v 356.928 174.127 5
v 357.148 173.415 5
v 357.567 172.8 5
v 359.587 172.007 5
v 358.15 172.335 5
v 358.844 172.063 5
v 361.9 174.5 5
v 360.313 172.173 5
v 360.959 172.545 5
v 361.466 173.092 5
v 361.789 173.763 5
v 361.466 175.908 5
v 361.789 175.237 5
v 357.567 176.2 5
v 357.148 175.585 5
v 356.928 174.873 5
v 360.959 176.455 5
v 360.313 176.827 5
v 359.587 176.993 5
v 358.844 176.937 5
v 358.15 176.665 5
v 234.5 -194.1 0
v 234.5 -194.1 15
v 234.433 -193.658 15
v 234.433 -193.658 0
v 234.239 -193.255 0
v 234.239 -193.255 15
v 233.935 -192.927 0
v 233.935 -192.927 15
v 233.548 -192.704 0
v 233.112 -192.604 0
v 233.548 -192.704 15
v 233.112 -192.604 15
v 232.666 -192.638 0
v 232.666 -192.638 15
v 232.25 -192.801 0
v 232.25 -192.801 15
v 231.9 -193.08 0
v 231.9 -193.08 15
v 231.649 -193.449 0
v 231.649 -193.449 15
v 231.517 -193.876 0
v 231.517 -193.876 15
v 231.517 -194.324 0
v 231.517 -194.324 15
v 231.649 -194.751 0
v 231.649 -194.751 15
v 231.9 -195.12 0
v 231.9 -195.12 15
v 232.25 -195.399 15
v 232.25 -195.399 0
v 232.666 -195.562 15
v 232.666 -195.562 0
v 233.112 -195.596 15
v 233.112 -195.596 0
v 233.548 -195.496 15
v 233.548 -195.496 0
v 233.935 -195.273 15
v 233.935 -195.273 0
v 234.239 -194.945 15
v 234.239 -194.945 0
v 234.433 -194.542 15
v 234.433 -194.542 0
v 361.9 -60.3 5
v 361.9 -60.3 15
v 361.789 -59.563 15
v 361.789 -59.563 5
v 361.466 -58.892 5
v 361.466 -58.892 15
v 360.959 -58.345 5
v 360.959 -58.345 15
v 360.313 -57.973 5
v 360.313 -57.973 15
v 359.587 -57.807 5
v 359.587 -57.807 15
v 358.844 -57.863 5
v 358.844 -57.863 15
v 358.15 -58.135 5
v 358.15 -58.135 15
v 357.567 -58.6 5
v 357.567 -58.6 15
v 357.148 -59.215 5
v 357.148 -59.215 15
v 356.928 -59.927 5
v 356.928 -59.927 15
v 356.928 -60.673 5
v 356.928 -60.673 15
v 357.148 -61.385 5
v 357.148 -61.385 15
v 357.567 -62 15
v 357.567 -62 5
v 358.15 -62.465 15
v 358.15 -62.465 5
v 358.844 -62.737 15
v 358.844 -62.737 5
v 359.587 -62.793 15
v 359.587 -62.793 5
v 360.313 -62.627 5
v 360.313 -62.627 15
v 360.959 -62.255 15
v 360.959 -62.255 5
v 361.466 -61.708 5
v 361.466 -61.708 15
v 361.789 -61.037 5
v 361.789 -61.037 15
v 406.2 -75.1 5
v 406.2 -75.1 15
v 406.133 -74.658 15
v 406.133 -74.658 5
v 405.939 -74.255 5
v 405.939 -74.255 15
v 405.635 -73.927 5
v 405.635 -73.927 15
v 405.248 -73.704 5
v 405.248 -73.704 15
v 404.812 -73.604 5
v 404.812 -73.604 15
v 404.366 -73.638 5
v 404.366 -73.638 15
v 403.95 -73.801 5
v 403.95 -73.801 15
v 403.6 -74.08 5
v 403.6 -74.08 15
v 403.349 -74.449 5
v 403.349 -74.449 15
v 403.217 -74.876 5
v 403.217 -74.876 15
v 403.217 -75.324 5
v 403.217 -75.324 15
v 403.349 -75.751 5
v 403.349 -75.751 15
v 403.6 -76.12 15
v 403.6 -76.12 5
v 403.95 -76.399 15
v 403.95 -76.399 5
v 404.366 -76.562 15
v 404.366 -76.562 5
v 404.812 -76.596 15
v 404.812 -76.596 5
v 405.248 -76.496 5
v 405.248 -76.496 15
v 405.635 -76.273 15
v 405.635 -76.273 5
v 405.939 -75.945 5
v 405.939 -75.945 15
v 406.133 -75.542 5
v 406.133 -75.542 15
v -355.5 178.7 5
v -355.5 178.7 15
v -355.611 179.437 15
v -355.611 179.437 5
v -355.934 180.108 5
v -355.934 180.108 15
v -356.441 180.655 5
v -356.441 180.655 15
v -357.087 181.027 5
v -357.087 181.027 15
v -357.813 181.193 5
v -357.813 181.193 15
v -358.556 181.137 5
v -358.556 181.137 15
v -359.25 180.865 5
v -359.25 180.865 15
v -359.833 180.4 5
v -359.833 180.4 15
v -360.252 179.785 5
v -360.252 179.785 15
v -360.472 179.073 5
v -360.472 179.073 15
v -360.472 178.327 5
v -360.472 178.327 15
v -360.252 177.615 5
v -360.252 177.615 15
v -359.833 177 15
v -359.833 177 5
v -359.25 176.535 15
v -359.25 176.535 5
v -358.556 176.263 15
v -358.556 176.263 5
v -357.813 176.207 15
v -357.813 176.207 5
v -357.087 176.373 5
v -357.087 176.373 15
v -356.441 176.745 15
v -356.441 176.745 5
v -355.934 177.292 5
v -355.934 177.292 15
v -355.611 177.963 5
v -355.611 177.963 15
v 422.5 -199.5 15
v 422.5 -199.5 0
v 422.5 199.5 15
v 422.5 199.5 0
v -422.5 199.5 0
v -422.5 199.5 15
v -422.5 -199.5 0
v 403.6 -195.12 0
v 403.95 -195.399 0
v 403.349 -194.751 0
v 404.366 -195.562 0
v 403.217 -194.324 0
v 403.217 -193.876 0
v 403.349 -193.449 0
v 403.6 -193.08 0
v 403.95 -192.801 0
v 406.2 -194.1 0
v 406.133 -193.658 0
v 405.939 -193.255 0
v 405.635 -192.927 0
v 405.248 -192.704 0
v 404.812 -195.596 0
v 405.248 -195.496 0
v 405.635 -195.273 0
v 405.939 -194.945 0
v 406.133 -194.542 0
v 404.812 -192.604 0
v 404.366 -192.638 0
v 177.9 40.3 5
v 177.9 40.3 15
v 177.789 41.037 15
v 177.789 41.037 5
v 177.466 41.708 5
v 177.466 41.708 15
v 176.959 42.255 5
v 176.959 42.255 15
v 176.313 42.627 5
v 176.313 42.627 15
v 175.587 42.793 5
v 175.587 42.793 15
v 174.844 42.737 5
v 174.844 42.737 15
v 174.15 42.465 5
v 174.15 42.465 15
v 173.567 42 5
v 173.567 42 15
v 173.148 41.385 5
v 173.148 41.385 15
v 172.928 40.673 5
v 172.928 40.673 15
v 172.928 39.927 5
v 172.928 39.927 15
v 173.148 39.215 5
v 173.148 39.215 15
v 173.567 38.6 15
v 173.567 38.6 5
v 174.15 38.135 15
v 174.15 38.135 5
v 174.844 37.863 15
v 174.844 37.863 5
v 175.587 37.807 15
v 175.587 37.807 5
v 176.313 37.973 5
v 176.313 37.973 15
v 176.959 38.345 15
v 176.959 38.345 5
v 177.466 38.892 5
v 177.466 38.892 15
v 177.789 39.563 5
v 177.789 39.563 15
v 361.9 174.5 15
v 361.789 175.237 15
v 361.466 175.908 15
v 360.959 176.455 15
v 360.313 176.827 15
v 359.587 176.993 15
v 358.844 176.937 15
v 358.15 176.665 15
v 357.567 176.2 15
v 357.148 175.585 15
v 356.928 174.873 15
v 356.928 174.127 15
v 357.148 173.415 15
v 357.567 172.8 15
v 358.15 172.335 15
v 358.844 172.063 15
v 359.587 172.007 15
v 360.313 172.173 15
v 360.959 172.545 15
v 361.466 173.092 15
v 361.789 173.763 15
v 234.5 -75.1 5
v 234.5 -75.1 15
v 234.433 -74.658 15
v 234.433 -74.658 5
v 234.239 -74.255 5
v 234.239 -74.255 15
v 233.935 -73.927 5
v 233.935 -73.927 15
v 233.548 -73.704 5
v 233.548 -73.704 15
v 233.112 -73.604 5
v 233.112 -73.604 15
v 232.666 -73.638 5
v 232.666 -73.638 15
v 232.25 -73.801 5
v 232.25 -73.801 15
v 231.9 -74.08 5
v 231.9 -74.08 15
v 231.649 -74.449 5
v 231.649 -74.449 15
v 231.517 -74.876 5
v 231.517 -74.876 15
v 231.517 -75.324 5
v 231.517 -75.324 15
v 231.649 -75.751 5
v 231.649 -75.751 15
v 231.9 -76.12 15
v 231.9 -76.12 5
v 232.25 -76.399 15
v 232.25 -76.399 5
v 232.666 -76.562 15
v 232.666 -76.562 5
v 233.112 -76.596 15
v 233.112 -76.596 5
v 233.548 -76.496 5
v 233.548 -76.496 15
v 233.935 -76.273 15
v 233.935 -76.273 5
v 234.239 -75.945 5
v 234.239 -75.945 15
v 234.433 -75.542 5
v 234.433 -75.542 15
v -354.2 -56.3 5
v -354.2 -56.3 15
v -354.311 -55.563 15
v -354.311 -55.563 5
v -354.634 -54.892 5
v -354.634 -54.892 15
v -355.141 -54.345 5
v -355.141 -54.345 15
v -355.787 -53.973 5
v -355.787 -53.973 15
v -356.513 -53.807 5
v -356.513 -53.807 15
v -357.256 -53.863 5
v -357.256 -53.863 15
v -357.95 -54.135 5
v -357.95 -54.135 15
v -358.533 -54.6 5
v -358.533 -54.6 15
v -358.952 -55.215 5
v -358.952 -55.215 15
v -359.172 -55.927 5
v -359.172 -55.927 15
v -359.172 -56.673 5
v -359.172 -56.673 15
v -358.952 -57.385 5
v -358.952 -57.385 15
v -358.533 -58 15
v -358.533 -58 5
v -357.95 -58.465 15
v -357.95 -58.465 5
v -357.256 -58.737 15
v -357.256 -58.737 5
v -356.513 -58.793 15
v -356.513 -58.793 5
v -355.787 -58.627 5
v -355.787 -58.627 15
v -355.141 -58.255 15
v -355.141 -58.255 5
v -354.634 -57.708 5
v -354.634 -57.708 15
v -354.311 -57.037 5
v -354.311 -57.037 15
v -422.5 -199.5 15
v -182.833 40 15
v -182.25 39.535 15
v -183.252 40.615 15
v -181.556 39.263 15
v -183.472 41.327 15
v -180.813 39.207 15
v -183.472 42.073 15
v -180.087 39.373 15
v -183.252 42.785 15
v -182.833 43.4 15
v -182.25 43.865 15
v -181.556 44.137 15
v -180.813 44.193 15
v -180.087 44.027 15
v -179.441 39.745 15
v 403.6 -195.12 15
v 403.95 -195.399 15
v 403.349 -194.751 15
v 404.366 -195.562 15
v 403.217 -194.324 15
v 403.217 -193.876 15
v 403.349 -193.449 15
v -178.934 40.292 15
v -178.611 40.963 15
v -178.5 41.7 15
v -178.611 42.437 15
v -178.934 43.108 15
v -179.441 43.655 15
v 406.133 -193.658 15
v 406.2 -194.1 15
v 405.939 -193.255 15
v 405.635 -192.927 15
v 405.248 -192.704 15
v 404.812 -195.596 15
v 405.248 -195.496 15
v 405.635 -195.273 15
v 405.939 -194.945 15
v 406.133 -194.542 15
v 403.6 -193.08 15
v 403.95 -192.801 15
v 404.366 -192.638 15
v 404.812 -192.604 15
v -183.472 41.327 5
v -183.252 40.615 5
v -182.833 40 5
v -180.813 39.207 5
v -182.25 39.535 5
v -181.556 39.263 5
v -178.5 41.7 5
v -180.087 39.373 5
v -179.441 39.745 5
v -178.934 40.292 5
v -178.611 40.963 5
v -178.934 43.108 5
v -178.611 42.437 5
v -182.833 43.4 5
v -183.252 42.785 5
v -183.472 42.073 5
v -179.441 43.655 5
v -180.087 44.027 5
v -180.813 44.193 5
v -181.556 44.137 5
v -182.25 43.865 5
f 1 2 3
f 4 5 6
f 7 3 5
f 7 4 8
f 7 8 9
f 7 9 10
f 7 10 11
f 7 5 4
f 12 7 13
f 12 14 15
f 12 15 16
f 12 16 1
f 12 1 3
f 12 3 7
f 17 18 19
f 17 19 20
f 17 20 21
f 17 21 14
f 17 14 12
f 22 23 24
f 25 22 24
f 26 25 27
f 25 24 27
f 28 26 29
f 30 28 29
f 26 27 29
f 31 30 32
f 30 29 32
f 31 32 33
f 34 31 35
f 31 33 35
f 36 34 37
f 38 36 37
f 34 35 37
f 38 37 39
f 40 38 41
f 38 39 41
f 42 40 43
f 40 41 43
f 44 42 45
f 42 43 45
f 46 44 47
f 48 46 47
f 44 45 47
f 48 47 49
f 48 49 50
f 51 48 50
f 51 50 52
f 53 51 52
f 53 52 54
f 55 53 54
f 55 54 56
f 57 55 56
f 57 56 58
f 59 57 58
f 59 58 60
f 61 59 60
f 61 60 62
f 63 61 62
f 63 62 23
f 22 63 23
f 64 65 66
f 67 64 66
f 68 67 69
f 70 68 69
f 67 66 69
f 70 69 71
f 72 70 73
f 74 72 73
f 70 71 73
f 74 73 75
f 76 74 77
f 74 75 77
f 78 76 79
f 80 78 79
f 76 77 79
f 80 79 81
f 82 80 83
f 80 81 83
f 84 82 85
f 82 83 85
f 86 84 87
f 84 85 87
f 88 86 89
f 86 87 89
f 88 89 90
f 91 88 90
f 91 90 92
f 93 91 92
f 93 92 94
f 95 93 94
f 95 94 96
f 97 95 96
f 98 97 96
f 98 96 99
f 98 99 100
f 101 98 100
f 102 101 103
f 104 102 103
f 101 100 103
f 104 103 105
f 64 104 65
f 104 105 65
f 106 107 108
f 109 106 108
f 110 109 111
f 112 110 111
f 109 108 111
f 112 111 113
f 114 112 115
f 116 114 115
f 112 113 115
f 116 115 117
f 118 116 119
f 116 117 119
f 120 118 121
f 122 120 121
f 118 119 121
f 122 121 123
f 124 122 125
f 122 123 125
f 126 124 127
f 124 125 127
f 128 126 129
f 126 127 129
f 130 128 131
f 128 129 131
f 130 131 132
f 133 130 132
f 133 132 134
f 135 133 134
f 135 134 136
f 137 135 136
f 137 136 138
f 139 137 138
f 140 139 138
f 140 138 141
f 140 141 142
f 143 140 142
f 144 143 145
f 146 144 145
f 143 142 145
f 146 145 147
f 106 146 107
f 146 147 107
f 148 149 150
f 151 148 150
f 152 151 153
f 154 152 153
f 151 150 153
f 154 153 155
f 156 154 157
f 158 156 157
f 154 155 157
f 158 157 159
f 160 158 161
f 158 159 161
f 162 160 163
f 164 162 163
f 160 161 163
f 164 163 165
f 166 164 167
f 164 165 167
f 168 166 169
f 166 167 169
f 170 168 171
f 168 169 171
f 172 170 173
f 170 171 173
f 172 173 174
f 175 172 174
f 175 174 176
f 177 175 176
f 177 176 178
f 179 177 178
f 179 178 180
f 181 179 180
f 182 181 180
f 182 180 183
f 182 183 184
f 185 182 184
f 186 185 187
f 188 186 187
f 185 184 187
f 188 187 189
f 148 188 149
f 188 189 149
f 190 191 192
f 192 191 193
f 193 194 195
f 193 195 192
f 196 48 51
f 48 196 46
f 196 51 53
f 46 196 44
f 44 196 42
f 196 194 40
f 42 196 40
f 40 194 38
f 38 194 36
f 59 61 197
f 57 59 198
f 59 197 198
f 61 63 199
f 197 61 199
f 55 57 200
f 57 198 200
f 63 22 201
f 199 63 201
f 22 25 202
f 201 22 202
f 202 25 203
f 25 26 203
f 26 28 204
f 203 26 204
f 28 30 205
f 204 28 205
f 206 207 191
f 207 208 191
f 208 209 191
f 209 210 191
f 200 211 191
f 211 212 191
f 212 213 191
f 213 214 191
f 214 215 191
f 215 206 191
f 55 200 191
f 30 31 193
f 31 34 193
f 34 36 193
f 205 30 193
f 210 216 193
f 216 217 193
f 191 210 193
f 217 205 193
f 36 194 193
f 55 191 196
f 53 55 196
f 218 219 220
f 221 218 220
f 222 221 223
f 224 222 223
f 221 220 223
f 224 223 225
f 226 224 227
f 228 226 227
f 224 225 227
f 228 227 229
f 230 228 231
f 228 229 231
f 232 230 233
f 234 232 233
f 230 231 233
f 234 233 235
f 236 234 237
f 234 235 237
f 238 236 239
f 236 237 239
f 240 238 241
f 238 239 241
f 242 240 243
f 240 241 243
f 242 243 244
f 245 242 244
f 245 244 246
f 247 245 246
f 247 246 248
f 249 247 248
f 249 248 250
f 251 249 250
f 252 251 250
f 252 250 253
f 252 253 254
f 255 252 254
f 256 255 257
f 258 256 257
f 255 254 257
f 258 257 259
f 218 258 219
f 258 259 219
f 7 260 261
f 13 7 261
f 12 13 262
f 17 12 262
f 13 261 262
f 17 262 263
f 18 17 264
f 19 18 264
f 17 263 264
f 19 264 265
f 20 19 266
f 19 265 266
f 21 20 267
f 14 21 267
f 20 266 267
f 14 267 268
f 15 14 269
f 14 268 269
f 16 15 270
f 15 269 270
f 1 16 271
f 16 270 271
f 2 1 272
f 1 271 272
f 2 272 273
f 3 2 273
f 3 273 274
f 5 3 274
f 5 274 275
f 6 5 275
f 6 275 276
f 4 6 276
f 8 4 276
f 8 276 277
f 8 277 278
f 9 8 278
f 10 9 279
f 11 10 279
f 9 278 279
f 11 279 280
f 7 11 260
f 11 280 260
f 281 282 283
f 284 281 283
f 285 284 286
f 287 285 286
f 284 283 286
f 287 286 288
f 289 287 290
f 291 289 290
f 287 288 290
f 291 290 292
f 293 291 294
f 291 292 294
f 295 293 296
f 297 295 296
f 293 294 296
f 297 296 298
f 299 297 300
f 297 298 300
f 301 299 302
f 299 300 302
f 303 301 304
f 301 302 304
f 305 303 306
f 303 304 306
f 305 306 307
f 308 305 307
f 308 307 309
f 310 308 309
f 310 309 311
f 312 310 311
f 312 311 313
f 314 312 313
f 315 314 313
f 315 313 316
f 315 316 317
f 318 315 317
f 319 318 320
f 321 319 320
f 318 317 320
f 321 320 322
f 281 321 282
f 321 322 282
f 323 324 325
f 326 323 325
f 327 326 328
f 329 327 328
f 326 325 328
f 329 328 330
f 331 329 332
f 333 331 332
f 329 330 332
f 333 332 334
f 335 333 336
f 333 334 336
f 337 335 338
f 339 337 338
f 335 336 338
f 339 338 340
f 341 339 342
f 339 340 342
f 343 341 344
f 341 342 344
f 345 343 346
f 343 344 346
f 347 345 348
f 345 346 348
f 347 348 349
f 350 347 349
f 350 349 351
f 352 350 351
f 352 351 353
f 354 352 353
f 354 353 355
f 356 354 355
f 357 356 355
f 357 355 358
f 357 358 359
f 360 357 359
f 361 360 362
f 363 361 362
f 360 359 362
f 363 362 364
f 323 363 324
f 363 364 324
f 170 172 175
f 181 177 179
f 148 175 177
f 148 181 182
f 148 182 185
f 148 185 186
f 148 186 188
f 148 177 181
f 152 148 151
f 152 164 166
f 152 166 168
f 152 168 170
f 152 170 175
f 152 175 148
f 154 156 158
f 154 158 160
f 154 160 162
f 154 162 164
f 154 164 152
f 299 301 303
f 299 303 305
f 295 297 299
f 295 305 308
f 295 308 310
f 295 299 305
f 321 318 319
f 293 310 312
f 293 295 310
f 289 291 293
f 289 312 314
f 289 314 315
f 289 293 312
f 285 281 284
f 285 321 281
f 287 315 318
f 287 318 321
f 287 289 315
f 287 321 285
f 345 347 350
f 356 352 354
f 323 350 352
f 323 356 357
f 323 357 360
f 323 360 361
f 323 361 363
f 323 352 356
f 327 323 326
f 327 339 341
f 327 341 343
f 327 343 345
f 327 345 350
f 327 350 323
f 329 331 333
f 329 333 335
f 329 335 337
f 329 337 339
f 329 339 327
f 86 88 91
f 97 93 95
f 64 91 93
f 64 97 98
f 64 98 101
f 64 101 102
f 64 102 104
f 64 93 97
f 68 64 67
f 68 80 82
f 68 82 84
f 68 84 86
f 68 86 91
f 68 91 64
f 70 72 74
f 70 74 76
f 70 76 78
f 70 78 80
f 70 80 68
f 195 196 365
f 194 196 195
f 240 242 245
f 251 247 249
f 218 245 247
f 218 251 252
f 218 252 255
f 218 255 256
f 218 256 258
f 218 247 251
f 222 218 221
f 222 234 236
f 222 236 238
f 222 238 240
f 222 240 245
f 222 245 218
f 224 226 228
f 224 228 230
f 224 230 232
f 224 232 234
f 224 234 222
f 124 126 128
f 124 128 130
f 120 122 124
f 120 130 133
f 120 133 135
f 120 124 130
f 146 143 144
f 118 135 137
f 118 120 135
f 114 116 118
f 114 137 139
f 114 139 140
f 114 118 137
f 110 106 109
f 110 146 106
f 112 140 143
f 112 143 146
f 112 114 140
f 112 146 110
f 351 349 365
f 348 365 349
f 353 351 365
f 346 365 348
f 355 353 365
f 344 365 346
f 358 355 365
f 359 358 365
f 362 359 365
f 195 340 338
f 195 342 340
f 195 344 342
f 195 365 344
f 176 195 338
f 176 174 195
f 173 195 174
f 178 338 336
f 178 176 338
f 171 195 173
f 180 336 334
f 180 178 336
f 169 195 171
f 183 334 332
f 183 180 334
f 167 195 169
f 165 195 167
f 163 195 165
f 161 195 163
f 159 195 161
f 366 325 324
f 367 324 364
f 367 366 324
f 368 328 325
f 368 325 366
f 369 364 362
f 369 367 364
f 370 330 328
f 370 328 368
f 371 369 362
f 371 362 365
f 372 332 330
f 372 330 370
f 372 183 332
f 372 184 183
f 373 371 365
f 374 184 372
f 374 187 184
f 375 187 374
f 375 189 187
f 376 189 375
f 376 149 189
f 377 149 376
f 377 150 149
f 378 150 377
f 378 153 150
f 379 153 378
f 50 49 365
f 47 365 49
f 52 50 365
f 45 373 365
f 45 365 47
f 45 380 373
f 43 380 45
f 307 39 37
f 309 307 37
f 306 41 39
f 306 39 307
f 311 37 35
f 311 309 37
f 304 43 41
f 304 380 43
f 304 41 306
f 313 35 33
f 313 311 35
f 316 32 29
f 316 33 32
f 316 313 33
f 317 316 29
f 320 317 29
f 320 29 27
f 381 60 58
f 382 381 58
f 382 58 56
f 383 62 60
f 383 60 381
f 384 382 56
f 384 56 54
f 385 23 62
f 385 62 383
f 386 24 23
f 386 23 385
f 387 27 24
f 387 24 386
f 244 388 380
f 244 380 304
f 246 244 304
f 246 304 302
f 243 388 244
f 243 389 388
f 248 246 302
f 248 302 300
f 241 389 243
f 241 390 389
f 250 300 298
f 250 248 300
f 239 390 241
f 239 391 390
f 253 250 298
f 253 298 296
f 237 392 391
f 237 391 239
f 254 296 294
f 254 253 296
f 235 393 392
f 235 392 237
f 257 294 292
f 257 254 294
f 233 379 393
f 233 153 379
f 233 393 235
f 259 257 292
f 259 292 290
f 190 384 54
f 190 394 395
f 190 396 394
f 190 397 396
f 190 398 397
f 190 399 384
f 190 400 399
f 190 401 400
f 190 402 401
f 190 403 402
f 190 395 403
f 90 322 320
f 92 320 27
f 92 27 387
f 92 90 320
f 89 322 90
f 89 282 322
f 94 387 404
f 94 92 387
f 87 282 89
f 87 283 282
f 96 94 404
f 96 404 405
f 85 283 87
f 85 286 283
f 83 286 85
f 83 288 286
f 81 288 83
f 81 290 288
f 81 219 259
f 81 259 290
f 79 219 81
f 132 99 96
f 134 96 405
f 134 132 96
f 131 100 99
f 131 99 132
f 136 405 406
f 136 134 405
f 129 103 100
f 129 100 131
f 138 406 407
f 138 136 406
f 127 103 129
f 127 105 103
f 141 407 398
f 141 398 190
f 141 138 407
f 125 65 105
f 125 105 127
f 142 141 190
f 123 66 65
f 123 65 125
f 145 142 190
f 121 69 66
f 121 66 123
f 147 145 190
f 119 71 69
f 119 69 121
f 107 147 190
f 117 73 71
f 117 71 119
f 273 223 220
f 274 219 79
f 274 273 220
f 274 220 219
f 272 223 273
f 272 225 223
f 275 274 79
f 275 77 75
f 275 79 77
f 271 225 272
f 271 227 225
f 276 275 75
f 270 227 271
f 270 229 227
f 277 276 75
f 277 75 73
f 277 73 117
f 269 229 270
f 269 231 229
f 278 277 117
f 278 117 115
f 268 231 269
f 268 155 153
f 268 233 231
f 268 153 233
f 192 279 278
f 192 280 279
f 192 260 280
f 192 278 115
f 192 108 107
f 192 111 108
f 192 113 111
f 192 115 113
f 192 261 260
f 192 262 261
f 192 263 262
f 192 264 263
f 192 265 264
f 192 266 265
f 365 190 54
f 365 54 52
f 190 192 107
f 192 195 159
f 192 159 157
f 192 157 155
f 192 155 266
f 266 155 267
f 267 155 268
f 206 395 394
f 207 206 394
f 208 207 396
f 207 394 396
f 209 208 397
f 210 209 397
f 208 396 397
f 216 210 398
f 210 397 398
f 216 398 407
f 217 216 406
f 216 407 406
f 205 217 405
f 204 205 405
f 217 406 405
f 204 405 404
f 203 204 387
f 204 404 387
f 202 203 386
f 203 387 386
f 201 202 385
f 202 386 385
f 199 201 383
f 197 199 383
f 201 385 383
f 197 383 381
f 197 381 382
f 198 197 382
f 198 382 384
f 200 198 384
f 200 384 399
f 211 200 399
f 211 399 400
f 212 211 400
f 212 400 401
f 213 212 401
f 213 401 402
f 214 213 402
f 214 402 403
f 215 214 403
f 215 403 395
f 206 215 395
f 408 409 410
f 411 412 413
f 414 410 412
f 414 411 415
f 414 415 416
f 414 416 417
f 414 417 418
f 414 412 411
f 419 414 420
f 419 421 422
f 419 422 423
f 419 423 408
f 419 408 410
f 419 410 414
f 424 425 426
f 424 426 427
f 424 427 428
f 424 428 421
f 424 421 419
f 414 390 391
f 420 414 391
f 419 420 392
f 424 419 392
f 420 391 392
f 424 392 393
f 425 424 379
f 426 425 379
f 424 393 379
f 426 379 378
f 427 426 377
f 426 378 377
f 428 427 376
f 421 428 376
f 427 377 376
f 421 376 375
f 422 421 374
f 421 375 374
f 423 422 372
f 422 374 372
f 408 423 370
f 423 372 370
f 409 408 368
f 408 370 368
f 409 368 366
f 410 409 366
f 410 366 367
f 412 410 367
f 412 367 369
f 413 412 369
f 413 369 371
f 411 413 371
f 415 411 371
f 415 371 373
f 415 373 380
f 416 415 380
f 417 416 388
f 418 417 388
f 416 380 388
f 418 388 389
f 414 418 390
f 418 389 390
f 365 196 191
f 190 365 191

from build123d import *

# Parameters (mm, degrees)
ESBO_O1_W                = 845
ESBO_O1_H                = 399
RESSALTO_EXTRUS_O1_DEPTH = 15
ESBO_O2_R                = 2.5
CORTE_EXTRUS_O1_DEPTH    = 10
ESBO_O3_R                = 1.5
CORTE_EXTRUS_O2_DEPTH    = 10
ESBO_O4_R                = 1.5
CORTE_EXTRUS_O3_DEPTH    = 468.473528662


with BuildPart() as part:
    # Esboço1 → Ressalto-extrusão1 (new body)
    with BuildSketch(Plane.XY):
        Rectangle(ESBO_O1_W, ESBO_O1_H)
    extrude(amount=RESSALTO_EXTRUS_O1_DEPTH)

    # Esboço2 → Corte-extrusão1 (cut)
    with BuildSketch(Plane.XY.offset(15)):
        with Locations((-358, 178.7)):
            Circle(ESBO_O2_R)
        with Locations((-356.7, -56.3)):
            Circle(ESBO_O2_R)
        with Locations((-181, 41.7)):
            Circle(ESBO_O2_R)
        with Locations((359.4, -60.3)):
            Circle(ESBO_O2_R)
        with Locations((359.4, 174.5)):
            Circle(ESBO_O2_R)
        with Locations((175.4, 40.3)):
            Circle(ESBO_O2_R)
    extrude(amount=-CORTE_EXTRUS_O1_DEPTH, mode=Mode.SUBTRACT)

    # Esboço3 → Corte-extrusão2 (cut)
    with BuildSketch(Plane.XY.offset(15)):
        with Locations((233, -75.1)):
            Circle(ESBO_O3_R)
        with Locations((404.7, -75.1)):
            Circle(ESBO_O3_R)
    extrude(amount=-CORTE_EXTRUS_O2_DEPTH, mode=Mode.SUBTRACT)

    # Esboço4 → Corte-extrusão3 (cut, through all)
    with BuildSketch(Plane.XY.offset(15)):
        with Locations((233, -194.1)):
            Circle(ESBO_O4_R)
        with Locations((404.7, -194.1)):
            Circle(ESBO_O4_R)
    extrude(amount=-CORTE_EXTRUS_O3_DEPTH, mode=Mode.SUBTRACT)


solid = part.part
